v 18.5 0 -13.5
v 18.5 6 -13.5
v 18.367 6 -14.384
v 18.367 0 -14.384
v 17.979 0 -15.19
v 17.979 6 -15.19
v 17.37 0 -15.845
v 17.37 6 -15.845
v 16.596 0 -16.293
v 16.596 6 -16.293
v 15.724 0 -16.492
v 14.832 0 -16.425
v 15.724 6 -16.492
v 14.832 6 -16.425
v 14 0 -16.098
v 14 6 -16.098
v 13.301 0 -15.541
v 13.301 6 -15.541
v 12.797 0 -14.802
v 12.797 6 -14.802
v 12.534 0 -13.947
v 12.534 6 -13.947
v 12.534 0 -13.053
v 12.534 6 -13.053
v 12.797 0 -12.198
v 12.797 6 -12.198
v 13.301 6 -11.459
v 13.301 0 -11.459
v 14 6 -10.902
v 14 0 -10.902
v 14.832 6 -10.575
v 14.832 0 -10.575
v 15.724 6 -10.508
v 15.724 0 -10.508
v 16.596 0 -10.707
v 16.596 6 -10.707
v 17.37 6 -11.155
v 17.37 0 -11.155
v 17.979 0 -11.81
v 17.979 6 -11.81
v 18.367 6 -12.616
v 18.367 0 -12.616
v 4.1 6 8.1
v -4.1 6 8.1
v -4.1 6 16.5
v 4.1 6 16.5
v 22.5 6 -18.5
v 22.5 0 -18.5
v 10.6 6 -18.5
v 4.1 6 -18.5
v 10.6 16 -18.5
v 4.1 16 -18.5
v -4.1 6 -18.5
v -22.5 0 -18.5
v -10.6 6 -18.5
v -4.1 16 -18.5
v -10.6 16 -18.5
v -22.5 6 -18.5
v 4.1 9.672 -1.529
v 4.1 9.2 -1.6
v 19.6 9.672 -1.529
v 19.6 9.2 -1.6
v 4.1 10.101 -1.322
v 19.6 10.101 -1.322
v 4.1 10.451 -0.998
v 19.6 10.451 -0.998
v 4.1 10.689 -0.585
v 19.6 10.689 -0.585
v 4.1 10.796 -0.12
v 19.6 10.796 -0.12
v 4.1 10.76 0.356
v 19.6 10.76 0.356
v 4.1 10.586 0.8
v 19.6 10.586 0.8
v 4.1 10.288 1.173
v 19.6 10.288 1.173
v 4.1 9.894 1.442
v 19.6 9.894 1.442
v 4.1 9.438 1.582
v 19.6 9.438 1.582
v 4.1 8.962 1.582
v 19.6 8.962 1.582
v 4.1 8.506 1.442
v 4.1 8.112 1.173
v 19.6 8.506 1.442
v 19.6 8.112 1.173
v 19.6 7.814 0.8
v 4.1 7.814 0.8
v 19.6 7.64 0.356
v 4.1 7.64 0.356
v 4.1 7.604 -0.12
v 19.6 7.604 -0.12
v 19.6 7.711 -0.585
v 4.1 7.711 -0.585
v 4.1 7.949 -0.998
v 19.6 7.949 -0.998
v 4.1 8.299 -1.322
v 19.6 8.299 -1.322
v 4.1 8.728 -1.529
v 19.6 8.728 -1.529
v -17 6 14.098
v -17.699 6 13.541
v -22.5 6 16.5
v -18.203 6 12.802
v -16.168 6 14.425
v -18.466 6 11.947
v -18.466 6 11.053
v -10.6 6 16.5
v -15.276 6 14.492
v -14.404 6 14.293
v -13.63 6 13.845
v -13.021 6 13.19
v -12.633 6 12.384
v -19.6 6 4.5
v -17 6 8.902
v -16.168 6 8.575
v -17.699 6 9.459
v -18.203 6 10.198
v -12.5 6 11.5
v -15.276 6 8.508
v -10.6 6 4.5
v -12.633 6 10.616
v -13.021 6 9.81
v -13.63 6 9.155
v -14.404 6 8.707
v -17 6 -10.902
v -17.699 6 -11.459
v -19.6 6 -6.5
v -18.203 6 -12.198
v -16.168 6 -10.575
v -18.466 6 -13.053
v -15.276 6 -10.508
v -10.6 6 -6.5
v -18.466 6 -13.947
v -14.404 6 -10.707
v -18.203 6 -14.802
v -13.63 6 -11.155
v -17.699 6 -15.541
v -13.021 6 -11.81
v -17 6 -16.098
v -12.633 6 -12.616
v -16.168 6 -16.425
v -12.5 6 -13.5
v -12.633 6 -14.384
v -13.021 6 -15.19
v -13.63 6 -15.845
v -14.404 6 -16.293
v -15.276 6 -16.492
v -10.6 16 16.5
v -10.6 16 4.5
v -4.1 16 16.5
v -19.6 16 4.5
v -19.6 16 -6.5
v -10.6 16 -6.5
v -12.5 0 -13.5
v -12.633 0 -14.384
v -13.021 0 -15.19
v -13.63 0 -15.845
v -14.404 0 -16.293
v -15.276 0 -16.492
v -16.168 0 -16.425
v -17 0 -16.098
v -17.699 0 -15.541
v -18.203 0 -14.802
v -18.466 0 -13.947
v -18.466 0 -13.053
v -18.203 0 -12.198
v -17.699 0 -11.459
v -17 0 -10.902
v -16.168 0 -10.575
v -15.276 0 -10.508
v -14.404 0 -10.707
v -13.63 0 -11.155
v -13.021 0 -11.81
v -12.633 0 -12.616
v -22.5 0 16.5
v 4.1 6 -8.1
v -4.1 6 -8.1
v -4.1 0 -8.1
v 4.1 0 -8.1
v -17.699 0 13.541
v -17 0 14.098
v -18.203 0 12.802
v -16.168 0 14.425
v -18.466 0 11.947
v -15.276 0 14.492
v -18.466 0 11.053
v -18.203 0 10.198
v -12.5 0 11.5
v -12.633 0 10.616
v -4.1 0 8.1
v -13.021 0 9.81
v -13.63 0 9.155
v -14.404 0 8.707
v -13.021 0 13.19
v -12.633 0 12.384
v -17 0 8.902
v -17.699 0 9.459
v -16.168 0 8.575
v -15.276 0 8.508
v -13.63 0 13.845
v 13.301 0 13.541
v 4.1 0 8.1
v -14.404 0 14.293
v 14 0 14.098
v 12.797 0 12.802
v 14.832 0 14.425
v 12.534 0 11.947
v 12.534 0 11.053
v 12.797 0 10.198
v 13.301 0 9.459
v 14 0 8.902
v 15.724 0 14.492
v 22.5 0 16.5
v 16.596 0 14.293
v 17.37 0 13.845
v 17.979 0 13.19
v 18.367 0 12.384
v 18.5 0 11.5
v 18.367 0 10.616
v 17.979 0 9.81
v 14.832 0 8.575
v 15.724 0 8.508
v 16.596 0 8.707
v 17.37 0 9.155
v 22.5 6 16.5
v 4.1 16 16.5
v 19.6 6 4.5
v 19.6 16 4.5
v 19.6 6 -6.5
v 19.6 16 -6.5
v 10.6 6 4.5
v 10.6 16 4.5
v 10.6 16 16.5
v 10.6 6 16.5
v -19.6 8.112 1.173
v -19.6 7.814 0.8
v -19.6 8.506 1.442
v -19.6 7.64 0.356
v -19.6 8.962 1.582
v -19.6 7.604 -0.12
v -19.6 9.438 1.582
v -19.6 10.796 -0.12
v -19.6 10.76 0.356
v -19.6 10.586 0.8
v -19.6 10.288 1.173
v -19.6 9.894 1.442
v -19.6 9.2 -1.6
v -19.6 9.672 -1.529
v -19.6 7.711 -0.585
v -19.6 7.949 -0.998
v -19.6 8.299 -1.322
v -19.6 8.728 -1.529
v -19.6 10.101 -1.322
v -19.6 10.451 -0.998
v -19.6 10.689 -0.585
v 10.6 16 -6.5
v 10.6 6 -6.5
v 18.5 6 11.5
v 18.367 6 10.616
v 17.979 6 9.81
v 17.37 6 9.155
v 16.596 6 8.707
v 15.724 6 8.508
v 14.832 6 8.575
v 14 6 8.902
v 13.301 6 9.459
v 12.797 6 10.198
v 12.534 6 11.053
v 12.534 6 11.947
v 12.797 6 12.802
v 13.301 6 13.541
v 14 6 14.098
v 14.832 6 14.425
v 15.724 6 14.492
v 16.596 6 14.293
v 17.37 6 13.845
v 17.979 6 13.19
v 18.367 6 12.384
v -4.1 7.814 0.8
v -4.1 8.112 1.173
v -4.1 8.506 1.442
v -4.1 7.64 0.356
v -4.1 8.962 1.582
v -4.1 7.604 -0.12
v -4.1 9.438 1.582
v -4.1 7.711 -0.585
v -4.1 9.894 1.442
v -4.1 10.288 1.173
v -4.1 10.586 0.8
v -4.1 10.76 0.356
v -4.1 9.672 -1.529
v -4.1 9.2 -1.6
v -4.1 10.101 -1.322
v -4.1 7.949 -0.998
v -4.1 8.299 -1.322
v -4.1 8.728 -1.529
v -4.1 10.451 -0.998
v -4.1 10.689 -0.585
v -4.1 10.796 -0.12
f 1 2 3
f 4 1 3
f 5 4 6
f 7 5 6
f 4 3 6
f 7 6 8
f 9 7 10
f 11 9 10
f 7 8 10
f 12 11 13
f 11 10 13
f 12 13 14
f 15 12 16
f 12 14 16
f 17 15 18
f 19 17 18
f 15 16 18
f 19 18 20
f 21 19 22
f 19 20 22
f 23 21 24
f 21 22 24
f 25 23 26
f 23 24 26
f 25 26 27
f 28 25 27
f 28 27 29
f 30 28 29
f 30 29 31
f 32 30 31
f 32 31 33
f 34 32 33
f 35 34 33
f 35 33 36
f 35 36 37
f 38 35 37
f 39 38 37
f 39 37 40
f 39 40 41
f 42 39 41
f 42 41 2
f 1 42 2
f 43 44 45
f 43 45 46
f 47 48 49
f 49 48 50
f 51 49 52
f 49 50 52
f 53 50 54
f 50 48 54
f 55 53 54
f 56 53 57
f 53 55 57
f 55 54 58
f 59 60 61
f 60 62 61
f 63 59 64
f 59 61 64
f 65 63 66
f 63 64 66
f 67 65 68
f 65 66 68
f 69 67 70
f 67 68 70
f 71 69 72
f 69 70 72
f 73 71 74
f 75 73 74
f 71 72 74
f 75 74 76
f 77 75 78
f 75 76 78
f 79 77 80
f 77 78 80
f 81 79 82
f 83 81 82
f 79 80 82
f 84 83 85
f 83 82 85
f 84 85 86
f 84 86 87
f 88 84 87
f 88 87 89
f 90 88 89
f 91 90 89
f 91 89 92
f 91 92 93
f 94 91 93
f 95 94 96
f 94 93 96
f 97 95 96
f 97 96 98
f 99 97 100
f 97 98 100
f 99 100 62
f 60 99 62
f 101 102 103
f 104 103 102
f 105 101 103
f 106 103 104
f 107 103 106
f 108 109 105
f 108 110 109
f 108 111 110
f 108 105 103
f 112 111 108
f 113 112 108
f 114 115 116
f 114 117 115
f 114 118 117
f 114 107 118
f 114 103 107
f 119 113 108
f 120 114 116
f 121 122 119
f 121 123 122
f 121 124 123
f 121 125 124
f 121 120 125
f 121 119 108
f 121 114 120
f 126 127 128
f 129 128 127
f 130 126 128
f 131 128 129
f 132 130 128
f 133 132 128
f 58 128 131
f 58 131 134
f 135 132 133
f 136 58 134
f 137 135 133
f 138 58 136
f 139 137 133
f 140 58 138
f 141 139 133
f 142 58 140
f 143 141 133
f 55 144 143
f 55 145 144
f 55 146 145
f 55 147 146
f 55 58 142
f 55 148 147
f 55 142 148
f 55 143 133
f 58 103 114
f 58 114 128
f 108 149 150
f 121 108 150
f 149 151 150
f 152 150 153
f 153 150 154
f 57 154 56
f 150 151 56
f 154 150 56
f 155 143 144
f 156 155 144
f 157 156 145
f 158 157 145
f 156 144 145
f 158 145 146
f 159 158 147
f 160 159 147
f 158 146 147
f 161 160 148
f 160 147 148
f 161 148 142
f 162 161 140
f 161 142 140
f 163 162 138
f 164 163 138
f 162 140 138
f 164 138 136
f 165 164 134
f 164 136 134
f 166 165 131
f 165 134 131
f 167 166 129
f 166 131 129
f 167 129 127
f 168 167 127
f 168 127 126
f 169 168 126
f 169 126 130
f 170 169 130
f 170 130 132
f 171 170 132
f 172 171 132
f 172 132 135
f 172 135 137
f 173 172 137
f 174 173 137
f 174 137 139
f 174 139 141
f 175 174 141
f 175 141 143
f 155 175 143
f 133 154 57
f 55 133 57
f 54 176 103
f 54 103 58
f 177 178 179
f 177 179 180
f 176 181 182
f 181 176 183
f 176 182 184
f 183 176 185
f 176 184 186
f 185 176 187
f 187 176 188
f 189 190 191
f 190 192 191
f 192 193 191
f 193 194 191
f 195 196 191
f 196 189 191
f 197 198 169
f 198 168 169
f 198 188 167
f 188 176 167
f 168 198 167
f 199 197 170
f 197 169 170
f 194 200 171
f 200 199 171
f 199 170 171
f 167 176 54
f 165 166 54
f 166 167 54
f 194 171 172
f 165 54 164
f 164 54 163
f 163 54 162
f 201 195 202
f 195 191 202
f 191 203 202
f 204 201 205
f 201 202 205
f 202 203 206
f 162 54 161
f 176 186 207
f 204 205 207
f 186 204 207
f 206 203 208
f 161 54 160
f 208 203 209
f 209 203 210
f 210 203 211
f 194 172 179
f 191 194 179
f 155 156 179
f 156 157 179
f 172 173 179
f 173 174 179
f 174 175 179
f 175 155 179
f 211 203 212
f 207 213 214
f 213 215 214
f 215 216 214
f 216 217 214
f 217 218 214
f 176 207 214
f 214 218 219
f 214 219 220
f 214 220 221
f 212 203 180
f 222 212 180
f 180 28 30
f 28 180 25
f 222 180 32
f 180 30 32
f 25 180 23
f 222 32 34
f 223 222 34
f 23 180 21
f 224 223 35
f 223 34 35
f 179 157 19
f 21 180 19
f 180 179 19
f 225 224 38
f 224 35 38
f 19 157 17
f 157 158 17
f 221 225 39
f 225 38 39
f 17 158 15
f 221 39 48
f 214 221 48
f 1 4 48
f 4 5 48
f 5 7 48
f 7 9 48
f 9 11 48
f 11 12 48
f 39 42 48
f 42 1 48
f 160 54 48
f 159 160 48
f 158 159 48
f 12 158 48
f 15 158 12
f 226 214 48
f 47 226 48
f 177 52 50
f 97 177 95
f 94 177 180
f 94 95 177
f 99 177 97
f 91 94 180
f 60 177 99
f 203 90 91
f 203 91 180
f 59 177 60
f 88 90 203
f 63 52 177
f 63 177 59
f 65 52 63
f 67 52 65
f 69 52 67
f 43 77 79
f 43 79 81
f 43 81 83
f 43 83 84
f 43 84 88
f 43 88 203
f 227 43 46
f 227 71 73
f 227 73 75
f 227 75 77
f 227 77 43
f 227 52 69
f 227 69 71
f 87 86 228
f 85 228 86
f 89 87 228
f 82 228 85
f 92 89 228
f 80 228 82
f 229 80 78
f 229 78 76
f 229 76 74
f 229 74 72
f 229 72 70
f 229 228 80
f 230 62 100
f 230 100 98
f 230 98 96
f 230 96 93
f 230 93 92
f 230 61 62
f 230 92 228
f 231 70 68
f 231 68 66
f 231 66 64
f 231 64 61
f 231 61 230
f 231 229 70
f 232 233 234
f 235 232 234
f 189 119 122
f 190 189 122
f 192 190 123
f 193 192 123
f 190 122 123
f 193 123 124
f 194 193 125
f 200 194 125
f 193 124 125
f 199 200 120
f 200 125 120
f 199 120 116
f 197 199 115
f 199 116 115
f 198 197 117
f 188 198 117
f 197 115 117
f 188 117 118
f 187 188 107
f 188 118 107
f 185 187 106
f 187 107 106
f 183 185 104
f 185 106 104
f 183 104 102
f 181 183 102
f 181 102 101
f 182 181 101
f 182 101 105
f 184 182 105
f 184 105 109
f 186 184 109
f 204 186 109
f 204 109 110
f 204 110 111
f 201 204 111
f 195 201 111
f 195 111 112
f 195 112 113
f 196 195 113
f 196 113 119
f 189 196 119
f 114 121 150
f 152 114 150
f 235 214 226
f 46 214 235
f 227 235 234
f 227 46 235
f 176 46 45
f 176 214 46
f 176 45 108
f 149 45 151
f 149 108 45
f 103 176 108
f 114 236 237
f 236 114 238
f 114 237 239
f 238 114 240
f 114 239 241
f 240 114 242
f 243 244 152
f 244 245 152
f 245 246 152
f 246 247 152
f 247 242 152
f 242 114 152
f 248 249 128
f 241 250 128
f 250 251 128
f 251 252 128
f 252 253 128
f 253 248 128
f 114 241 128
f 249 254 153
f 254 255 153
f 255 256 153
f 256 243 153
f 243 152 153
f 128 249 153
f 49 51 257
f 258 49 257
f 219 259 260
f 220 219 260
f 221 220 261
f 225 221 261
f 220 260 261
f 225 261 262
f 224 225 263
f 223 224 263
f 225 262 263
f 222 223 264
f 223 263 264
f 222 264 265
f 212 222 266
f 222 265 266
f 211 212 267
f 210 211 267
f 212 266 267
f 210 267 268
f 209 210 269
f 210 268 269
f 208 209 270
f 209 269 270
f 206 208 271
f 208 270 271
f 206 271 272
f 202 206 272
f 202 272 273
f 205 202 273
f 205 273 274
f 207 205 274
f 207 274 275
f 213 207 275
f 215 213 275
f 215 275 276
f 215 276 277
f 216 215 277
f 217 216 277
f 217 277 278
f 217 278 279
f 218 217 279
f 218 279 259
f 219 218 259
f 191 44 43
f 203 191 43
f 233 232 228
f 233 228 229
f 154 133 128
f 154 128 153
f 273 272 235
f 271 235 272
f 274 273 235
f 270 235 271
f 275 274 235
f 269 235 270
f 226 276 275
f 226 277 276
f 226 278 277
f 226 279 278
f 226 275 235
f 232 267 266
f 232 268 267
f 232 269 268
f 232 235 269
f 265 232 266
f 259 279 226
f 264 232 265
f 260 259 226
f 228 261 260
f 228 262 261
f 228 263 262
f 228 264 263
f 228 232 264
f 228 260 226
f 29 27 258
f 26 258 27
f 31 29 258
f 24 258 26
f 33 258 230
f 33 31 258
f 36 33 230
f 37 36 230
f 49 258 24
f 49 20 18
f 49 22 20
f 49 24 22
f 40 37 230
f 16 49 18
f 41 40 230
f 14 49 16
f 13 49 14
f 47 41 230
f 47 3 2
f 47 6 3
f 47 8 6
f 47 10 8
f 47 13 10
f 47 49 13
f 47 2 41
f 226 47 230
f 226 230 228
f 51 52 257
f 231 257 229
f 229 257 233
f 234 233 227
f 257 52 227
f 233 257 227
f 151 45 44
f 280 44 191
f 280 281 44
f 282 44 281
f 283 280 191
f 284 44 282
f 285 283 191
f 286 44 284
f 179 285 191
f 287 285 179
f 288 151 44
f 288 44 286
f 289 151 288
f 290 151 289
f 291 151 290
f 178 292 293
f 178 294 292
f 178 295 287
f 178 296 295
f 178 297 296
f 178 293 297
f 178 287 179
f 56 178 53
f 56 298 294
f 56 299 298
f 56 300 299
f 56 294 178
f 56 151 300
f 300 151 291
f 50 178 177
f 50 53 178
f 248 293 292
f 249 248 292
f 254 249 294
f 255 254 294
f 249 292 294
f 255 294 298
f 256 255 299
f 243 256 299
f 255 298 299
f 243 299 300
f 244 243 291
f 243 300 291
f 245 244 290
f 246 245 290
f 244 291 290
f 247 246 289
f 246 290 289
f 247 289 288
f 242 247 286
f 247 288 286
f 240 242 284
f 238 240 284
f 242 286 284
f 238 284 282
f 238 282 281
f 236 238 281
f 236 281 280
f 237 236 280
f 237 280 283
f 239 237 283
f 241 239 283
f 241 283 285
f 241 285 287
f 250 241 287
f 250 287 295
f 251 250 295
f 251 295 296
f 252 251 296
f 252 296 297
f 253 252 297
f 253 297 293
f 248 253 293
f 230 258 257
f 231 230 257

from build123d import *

# Parameters (mm, degrees)
ESQUISSE1_W                  = 45
ESQUISSE1_H                  = 35
BOSS_EXTRU_1_DEPTH           = 6
ESQUISSE2_R                  = 3
ENL_V_MAT_EXTRU_1_DEPTH      = 7
ESQUISSE3_W                  = 8.2
ESQUISSE3_H                  = 16.2
ENL_V_MAT_EXTRU_2_DEPTH      = 7
ESQUISSE4_W                  = 35
ESQUISSE4_H                  = 10
BOSS_EXTRU_2_DEPTH           = 6.5
ESQUISSE5_W                  = 35
ESQUISSE5_H                  = 10
BOSS_EXTRU_3_DEPTH           = 6.5
ESQUISSE7_W                  = 11
ESQUISSE7_H                  = 10
BOSS_EXTRU_4_DEPTH           = 9
ESQUISSE8_W                  = 11
ESQUISSE8_H                  = 10
BOSS_EXTRU_5_DEPTH           = 9
ESQUISSE6_R                  = 1.6
ENL_V_MAT_EXTRU_3_DEPTH      = 12.9
ENL_V_MAT_EXTRU_3_DEPTH_BACK = 34.1


with BuildPart() as part:
    # Esquisse1 → Boss.-Extru.1 (new body)
    with BuildSketch(Plane(origin=(0, 0, 0), x_dir=(1, 0, 0), z_dir=(0, 1, 0))):
        with Locations((0, 1)):
            Rectangle(ESQUISSE1_W, ESQUISSE1_H)
    extrude(amount=BOSS_EXTRU_1_DEPTH)

    # Esquisse2 → Enlèv. mat.-Extru.1 (cut, through all)
    with BuildSketch(Plane(origin=(0, 6, 0), x_dir=(1, 0, 0), z_dir=(0, 1, 0))):
        with Locations((-15.5, 13.5)):
            Circle(ESQUISSE2_R)
        with Locations((-15.5, -11.5)):
            Circle(ESQUISSE2_R)
        with Locations((15.5, -11.5)):
            Circle(ESQUISSE2_R)
        with Locations((15.5, 13.5)):
            Circle(ESQUISSE2_R)
    extrude(amount=-ENL_V_MAT_EXTRU_1_DEPTH, mode=Mode.SUBTRACT)

    # Esquisse3 → Enlèv. mat.-Extru.2 (cut, through all)
    with BuildSketch(Plane(origin=(0, 6, 0), x_dir=(1, 0, 0), z_dir=(0, 1, 0))):
        Rectangle(ESQUISSE3_W, ESQUISSE3_H)
    extrude(amount=-ENL_V_MAT_EXTRU_2_DEPTH, mode=Mode.SUBTRACT)

    # Esquisse4 → Boss.-Extru.2 (add)
    with BuildSketch(Plane(origin=(-4.1, 0, 0), x_dir=(0, 0, -1), z_dir=(1, 0, 0))):
        with Locations((1, 11)):
            Rectangle(ESQUISSE4_W, ESQUISSE4_H)
    extrude(amount=-BOSS_EXTRU_2_DEPTH)

    # Esquisse5 → Boss.-Extru.3 (add)
    with BuildSketch(Plane(origin=(4.1, 0, -4), x_dir=(0, 0, 1), z_dir=(-1, 0, 0))):
        with Locations((3, 11)):
            Rectangle(ESQUISSE5_W, ESQUISSE5_H)
    extrude(amount=-BOSS_EXTRU_3_DEPTH)

    # Esquisse7 → Boss.-Extru.4 (add)
    with BuildSketch(Plane(origin=(10.6, 0, 0), x_dir=(0, 0, -1), z_dir=(1, 0, 0))):
        with Locations((1, 11)):
            Rectangle(ESQUISSE7_W, ESQUISSE7_H)
    extrude(amount=BOSS_EXTRU_4_DEPTH)

    # Esquisse8 → Boss.-Extru.5 (add)
    with BuildSketch(Plane(origin=(-10.6, 0, -10.5), x_dir=(0, 0, -1), z_dir=(1, 0, 0))):
        with Locations((-9.5, 11)):
            Rectangle(ESQUISSE8_W, ESQUISSE8_H)
    extrude(amount=-BOSS_EXTRU_5_DEPTH)

    # Esquisse6 → Enlèv. mat.-Extru.3 (cut, two sides)
    with BuildSketch(Plane(origin=(10.6, 0, 0), x_dir=(0, 0, -1), z_dir=(1, 0, 0))) as enl_v_mat_extru_3_sk:
        with Locations((0, 9.2)):
            Circle(ESQUISSE6_R)
    extrude(amount=ENL_V_MAT_EXTRU_3_DEPTH, mode=Mode.SUBTRACT)
    extrude(enl_v_mat_extru_3_sk.sketch, amount=-ENL_V_MAT_EXTRU_3_DEPTH_BACK, mode=Mode.SUBTRACT)


solid = part.part
